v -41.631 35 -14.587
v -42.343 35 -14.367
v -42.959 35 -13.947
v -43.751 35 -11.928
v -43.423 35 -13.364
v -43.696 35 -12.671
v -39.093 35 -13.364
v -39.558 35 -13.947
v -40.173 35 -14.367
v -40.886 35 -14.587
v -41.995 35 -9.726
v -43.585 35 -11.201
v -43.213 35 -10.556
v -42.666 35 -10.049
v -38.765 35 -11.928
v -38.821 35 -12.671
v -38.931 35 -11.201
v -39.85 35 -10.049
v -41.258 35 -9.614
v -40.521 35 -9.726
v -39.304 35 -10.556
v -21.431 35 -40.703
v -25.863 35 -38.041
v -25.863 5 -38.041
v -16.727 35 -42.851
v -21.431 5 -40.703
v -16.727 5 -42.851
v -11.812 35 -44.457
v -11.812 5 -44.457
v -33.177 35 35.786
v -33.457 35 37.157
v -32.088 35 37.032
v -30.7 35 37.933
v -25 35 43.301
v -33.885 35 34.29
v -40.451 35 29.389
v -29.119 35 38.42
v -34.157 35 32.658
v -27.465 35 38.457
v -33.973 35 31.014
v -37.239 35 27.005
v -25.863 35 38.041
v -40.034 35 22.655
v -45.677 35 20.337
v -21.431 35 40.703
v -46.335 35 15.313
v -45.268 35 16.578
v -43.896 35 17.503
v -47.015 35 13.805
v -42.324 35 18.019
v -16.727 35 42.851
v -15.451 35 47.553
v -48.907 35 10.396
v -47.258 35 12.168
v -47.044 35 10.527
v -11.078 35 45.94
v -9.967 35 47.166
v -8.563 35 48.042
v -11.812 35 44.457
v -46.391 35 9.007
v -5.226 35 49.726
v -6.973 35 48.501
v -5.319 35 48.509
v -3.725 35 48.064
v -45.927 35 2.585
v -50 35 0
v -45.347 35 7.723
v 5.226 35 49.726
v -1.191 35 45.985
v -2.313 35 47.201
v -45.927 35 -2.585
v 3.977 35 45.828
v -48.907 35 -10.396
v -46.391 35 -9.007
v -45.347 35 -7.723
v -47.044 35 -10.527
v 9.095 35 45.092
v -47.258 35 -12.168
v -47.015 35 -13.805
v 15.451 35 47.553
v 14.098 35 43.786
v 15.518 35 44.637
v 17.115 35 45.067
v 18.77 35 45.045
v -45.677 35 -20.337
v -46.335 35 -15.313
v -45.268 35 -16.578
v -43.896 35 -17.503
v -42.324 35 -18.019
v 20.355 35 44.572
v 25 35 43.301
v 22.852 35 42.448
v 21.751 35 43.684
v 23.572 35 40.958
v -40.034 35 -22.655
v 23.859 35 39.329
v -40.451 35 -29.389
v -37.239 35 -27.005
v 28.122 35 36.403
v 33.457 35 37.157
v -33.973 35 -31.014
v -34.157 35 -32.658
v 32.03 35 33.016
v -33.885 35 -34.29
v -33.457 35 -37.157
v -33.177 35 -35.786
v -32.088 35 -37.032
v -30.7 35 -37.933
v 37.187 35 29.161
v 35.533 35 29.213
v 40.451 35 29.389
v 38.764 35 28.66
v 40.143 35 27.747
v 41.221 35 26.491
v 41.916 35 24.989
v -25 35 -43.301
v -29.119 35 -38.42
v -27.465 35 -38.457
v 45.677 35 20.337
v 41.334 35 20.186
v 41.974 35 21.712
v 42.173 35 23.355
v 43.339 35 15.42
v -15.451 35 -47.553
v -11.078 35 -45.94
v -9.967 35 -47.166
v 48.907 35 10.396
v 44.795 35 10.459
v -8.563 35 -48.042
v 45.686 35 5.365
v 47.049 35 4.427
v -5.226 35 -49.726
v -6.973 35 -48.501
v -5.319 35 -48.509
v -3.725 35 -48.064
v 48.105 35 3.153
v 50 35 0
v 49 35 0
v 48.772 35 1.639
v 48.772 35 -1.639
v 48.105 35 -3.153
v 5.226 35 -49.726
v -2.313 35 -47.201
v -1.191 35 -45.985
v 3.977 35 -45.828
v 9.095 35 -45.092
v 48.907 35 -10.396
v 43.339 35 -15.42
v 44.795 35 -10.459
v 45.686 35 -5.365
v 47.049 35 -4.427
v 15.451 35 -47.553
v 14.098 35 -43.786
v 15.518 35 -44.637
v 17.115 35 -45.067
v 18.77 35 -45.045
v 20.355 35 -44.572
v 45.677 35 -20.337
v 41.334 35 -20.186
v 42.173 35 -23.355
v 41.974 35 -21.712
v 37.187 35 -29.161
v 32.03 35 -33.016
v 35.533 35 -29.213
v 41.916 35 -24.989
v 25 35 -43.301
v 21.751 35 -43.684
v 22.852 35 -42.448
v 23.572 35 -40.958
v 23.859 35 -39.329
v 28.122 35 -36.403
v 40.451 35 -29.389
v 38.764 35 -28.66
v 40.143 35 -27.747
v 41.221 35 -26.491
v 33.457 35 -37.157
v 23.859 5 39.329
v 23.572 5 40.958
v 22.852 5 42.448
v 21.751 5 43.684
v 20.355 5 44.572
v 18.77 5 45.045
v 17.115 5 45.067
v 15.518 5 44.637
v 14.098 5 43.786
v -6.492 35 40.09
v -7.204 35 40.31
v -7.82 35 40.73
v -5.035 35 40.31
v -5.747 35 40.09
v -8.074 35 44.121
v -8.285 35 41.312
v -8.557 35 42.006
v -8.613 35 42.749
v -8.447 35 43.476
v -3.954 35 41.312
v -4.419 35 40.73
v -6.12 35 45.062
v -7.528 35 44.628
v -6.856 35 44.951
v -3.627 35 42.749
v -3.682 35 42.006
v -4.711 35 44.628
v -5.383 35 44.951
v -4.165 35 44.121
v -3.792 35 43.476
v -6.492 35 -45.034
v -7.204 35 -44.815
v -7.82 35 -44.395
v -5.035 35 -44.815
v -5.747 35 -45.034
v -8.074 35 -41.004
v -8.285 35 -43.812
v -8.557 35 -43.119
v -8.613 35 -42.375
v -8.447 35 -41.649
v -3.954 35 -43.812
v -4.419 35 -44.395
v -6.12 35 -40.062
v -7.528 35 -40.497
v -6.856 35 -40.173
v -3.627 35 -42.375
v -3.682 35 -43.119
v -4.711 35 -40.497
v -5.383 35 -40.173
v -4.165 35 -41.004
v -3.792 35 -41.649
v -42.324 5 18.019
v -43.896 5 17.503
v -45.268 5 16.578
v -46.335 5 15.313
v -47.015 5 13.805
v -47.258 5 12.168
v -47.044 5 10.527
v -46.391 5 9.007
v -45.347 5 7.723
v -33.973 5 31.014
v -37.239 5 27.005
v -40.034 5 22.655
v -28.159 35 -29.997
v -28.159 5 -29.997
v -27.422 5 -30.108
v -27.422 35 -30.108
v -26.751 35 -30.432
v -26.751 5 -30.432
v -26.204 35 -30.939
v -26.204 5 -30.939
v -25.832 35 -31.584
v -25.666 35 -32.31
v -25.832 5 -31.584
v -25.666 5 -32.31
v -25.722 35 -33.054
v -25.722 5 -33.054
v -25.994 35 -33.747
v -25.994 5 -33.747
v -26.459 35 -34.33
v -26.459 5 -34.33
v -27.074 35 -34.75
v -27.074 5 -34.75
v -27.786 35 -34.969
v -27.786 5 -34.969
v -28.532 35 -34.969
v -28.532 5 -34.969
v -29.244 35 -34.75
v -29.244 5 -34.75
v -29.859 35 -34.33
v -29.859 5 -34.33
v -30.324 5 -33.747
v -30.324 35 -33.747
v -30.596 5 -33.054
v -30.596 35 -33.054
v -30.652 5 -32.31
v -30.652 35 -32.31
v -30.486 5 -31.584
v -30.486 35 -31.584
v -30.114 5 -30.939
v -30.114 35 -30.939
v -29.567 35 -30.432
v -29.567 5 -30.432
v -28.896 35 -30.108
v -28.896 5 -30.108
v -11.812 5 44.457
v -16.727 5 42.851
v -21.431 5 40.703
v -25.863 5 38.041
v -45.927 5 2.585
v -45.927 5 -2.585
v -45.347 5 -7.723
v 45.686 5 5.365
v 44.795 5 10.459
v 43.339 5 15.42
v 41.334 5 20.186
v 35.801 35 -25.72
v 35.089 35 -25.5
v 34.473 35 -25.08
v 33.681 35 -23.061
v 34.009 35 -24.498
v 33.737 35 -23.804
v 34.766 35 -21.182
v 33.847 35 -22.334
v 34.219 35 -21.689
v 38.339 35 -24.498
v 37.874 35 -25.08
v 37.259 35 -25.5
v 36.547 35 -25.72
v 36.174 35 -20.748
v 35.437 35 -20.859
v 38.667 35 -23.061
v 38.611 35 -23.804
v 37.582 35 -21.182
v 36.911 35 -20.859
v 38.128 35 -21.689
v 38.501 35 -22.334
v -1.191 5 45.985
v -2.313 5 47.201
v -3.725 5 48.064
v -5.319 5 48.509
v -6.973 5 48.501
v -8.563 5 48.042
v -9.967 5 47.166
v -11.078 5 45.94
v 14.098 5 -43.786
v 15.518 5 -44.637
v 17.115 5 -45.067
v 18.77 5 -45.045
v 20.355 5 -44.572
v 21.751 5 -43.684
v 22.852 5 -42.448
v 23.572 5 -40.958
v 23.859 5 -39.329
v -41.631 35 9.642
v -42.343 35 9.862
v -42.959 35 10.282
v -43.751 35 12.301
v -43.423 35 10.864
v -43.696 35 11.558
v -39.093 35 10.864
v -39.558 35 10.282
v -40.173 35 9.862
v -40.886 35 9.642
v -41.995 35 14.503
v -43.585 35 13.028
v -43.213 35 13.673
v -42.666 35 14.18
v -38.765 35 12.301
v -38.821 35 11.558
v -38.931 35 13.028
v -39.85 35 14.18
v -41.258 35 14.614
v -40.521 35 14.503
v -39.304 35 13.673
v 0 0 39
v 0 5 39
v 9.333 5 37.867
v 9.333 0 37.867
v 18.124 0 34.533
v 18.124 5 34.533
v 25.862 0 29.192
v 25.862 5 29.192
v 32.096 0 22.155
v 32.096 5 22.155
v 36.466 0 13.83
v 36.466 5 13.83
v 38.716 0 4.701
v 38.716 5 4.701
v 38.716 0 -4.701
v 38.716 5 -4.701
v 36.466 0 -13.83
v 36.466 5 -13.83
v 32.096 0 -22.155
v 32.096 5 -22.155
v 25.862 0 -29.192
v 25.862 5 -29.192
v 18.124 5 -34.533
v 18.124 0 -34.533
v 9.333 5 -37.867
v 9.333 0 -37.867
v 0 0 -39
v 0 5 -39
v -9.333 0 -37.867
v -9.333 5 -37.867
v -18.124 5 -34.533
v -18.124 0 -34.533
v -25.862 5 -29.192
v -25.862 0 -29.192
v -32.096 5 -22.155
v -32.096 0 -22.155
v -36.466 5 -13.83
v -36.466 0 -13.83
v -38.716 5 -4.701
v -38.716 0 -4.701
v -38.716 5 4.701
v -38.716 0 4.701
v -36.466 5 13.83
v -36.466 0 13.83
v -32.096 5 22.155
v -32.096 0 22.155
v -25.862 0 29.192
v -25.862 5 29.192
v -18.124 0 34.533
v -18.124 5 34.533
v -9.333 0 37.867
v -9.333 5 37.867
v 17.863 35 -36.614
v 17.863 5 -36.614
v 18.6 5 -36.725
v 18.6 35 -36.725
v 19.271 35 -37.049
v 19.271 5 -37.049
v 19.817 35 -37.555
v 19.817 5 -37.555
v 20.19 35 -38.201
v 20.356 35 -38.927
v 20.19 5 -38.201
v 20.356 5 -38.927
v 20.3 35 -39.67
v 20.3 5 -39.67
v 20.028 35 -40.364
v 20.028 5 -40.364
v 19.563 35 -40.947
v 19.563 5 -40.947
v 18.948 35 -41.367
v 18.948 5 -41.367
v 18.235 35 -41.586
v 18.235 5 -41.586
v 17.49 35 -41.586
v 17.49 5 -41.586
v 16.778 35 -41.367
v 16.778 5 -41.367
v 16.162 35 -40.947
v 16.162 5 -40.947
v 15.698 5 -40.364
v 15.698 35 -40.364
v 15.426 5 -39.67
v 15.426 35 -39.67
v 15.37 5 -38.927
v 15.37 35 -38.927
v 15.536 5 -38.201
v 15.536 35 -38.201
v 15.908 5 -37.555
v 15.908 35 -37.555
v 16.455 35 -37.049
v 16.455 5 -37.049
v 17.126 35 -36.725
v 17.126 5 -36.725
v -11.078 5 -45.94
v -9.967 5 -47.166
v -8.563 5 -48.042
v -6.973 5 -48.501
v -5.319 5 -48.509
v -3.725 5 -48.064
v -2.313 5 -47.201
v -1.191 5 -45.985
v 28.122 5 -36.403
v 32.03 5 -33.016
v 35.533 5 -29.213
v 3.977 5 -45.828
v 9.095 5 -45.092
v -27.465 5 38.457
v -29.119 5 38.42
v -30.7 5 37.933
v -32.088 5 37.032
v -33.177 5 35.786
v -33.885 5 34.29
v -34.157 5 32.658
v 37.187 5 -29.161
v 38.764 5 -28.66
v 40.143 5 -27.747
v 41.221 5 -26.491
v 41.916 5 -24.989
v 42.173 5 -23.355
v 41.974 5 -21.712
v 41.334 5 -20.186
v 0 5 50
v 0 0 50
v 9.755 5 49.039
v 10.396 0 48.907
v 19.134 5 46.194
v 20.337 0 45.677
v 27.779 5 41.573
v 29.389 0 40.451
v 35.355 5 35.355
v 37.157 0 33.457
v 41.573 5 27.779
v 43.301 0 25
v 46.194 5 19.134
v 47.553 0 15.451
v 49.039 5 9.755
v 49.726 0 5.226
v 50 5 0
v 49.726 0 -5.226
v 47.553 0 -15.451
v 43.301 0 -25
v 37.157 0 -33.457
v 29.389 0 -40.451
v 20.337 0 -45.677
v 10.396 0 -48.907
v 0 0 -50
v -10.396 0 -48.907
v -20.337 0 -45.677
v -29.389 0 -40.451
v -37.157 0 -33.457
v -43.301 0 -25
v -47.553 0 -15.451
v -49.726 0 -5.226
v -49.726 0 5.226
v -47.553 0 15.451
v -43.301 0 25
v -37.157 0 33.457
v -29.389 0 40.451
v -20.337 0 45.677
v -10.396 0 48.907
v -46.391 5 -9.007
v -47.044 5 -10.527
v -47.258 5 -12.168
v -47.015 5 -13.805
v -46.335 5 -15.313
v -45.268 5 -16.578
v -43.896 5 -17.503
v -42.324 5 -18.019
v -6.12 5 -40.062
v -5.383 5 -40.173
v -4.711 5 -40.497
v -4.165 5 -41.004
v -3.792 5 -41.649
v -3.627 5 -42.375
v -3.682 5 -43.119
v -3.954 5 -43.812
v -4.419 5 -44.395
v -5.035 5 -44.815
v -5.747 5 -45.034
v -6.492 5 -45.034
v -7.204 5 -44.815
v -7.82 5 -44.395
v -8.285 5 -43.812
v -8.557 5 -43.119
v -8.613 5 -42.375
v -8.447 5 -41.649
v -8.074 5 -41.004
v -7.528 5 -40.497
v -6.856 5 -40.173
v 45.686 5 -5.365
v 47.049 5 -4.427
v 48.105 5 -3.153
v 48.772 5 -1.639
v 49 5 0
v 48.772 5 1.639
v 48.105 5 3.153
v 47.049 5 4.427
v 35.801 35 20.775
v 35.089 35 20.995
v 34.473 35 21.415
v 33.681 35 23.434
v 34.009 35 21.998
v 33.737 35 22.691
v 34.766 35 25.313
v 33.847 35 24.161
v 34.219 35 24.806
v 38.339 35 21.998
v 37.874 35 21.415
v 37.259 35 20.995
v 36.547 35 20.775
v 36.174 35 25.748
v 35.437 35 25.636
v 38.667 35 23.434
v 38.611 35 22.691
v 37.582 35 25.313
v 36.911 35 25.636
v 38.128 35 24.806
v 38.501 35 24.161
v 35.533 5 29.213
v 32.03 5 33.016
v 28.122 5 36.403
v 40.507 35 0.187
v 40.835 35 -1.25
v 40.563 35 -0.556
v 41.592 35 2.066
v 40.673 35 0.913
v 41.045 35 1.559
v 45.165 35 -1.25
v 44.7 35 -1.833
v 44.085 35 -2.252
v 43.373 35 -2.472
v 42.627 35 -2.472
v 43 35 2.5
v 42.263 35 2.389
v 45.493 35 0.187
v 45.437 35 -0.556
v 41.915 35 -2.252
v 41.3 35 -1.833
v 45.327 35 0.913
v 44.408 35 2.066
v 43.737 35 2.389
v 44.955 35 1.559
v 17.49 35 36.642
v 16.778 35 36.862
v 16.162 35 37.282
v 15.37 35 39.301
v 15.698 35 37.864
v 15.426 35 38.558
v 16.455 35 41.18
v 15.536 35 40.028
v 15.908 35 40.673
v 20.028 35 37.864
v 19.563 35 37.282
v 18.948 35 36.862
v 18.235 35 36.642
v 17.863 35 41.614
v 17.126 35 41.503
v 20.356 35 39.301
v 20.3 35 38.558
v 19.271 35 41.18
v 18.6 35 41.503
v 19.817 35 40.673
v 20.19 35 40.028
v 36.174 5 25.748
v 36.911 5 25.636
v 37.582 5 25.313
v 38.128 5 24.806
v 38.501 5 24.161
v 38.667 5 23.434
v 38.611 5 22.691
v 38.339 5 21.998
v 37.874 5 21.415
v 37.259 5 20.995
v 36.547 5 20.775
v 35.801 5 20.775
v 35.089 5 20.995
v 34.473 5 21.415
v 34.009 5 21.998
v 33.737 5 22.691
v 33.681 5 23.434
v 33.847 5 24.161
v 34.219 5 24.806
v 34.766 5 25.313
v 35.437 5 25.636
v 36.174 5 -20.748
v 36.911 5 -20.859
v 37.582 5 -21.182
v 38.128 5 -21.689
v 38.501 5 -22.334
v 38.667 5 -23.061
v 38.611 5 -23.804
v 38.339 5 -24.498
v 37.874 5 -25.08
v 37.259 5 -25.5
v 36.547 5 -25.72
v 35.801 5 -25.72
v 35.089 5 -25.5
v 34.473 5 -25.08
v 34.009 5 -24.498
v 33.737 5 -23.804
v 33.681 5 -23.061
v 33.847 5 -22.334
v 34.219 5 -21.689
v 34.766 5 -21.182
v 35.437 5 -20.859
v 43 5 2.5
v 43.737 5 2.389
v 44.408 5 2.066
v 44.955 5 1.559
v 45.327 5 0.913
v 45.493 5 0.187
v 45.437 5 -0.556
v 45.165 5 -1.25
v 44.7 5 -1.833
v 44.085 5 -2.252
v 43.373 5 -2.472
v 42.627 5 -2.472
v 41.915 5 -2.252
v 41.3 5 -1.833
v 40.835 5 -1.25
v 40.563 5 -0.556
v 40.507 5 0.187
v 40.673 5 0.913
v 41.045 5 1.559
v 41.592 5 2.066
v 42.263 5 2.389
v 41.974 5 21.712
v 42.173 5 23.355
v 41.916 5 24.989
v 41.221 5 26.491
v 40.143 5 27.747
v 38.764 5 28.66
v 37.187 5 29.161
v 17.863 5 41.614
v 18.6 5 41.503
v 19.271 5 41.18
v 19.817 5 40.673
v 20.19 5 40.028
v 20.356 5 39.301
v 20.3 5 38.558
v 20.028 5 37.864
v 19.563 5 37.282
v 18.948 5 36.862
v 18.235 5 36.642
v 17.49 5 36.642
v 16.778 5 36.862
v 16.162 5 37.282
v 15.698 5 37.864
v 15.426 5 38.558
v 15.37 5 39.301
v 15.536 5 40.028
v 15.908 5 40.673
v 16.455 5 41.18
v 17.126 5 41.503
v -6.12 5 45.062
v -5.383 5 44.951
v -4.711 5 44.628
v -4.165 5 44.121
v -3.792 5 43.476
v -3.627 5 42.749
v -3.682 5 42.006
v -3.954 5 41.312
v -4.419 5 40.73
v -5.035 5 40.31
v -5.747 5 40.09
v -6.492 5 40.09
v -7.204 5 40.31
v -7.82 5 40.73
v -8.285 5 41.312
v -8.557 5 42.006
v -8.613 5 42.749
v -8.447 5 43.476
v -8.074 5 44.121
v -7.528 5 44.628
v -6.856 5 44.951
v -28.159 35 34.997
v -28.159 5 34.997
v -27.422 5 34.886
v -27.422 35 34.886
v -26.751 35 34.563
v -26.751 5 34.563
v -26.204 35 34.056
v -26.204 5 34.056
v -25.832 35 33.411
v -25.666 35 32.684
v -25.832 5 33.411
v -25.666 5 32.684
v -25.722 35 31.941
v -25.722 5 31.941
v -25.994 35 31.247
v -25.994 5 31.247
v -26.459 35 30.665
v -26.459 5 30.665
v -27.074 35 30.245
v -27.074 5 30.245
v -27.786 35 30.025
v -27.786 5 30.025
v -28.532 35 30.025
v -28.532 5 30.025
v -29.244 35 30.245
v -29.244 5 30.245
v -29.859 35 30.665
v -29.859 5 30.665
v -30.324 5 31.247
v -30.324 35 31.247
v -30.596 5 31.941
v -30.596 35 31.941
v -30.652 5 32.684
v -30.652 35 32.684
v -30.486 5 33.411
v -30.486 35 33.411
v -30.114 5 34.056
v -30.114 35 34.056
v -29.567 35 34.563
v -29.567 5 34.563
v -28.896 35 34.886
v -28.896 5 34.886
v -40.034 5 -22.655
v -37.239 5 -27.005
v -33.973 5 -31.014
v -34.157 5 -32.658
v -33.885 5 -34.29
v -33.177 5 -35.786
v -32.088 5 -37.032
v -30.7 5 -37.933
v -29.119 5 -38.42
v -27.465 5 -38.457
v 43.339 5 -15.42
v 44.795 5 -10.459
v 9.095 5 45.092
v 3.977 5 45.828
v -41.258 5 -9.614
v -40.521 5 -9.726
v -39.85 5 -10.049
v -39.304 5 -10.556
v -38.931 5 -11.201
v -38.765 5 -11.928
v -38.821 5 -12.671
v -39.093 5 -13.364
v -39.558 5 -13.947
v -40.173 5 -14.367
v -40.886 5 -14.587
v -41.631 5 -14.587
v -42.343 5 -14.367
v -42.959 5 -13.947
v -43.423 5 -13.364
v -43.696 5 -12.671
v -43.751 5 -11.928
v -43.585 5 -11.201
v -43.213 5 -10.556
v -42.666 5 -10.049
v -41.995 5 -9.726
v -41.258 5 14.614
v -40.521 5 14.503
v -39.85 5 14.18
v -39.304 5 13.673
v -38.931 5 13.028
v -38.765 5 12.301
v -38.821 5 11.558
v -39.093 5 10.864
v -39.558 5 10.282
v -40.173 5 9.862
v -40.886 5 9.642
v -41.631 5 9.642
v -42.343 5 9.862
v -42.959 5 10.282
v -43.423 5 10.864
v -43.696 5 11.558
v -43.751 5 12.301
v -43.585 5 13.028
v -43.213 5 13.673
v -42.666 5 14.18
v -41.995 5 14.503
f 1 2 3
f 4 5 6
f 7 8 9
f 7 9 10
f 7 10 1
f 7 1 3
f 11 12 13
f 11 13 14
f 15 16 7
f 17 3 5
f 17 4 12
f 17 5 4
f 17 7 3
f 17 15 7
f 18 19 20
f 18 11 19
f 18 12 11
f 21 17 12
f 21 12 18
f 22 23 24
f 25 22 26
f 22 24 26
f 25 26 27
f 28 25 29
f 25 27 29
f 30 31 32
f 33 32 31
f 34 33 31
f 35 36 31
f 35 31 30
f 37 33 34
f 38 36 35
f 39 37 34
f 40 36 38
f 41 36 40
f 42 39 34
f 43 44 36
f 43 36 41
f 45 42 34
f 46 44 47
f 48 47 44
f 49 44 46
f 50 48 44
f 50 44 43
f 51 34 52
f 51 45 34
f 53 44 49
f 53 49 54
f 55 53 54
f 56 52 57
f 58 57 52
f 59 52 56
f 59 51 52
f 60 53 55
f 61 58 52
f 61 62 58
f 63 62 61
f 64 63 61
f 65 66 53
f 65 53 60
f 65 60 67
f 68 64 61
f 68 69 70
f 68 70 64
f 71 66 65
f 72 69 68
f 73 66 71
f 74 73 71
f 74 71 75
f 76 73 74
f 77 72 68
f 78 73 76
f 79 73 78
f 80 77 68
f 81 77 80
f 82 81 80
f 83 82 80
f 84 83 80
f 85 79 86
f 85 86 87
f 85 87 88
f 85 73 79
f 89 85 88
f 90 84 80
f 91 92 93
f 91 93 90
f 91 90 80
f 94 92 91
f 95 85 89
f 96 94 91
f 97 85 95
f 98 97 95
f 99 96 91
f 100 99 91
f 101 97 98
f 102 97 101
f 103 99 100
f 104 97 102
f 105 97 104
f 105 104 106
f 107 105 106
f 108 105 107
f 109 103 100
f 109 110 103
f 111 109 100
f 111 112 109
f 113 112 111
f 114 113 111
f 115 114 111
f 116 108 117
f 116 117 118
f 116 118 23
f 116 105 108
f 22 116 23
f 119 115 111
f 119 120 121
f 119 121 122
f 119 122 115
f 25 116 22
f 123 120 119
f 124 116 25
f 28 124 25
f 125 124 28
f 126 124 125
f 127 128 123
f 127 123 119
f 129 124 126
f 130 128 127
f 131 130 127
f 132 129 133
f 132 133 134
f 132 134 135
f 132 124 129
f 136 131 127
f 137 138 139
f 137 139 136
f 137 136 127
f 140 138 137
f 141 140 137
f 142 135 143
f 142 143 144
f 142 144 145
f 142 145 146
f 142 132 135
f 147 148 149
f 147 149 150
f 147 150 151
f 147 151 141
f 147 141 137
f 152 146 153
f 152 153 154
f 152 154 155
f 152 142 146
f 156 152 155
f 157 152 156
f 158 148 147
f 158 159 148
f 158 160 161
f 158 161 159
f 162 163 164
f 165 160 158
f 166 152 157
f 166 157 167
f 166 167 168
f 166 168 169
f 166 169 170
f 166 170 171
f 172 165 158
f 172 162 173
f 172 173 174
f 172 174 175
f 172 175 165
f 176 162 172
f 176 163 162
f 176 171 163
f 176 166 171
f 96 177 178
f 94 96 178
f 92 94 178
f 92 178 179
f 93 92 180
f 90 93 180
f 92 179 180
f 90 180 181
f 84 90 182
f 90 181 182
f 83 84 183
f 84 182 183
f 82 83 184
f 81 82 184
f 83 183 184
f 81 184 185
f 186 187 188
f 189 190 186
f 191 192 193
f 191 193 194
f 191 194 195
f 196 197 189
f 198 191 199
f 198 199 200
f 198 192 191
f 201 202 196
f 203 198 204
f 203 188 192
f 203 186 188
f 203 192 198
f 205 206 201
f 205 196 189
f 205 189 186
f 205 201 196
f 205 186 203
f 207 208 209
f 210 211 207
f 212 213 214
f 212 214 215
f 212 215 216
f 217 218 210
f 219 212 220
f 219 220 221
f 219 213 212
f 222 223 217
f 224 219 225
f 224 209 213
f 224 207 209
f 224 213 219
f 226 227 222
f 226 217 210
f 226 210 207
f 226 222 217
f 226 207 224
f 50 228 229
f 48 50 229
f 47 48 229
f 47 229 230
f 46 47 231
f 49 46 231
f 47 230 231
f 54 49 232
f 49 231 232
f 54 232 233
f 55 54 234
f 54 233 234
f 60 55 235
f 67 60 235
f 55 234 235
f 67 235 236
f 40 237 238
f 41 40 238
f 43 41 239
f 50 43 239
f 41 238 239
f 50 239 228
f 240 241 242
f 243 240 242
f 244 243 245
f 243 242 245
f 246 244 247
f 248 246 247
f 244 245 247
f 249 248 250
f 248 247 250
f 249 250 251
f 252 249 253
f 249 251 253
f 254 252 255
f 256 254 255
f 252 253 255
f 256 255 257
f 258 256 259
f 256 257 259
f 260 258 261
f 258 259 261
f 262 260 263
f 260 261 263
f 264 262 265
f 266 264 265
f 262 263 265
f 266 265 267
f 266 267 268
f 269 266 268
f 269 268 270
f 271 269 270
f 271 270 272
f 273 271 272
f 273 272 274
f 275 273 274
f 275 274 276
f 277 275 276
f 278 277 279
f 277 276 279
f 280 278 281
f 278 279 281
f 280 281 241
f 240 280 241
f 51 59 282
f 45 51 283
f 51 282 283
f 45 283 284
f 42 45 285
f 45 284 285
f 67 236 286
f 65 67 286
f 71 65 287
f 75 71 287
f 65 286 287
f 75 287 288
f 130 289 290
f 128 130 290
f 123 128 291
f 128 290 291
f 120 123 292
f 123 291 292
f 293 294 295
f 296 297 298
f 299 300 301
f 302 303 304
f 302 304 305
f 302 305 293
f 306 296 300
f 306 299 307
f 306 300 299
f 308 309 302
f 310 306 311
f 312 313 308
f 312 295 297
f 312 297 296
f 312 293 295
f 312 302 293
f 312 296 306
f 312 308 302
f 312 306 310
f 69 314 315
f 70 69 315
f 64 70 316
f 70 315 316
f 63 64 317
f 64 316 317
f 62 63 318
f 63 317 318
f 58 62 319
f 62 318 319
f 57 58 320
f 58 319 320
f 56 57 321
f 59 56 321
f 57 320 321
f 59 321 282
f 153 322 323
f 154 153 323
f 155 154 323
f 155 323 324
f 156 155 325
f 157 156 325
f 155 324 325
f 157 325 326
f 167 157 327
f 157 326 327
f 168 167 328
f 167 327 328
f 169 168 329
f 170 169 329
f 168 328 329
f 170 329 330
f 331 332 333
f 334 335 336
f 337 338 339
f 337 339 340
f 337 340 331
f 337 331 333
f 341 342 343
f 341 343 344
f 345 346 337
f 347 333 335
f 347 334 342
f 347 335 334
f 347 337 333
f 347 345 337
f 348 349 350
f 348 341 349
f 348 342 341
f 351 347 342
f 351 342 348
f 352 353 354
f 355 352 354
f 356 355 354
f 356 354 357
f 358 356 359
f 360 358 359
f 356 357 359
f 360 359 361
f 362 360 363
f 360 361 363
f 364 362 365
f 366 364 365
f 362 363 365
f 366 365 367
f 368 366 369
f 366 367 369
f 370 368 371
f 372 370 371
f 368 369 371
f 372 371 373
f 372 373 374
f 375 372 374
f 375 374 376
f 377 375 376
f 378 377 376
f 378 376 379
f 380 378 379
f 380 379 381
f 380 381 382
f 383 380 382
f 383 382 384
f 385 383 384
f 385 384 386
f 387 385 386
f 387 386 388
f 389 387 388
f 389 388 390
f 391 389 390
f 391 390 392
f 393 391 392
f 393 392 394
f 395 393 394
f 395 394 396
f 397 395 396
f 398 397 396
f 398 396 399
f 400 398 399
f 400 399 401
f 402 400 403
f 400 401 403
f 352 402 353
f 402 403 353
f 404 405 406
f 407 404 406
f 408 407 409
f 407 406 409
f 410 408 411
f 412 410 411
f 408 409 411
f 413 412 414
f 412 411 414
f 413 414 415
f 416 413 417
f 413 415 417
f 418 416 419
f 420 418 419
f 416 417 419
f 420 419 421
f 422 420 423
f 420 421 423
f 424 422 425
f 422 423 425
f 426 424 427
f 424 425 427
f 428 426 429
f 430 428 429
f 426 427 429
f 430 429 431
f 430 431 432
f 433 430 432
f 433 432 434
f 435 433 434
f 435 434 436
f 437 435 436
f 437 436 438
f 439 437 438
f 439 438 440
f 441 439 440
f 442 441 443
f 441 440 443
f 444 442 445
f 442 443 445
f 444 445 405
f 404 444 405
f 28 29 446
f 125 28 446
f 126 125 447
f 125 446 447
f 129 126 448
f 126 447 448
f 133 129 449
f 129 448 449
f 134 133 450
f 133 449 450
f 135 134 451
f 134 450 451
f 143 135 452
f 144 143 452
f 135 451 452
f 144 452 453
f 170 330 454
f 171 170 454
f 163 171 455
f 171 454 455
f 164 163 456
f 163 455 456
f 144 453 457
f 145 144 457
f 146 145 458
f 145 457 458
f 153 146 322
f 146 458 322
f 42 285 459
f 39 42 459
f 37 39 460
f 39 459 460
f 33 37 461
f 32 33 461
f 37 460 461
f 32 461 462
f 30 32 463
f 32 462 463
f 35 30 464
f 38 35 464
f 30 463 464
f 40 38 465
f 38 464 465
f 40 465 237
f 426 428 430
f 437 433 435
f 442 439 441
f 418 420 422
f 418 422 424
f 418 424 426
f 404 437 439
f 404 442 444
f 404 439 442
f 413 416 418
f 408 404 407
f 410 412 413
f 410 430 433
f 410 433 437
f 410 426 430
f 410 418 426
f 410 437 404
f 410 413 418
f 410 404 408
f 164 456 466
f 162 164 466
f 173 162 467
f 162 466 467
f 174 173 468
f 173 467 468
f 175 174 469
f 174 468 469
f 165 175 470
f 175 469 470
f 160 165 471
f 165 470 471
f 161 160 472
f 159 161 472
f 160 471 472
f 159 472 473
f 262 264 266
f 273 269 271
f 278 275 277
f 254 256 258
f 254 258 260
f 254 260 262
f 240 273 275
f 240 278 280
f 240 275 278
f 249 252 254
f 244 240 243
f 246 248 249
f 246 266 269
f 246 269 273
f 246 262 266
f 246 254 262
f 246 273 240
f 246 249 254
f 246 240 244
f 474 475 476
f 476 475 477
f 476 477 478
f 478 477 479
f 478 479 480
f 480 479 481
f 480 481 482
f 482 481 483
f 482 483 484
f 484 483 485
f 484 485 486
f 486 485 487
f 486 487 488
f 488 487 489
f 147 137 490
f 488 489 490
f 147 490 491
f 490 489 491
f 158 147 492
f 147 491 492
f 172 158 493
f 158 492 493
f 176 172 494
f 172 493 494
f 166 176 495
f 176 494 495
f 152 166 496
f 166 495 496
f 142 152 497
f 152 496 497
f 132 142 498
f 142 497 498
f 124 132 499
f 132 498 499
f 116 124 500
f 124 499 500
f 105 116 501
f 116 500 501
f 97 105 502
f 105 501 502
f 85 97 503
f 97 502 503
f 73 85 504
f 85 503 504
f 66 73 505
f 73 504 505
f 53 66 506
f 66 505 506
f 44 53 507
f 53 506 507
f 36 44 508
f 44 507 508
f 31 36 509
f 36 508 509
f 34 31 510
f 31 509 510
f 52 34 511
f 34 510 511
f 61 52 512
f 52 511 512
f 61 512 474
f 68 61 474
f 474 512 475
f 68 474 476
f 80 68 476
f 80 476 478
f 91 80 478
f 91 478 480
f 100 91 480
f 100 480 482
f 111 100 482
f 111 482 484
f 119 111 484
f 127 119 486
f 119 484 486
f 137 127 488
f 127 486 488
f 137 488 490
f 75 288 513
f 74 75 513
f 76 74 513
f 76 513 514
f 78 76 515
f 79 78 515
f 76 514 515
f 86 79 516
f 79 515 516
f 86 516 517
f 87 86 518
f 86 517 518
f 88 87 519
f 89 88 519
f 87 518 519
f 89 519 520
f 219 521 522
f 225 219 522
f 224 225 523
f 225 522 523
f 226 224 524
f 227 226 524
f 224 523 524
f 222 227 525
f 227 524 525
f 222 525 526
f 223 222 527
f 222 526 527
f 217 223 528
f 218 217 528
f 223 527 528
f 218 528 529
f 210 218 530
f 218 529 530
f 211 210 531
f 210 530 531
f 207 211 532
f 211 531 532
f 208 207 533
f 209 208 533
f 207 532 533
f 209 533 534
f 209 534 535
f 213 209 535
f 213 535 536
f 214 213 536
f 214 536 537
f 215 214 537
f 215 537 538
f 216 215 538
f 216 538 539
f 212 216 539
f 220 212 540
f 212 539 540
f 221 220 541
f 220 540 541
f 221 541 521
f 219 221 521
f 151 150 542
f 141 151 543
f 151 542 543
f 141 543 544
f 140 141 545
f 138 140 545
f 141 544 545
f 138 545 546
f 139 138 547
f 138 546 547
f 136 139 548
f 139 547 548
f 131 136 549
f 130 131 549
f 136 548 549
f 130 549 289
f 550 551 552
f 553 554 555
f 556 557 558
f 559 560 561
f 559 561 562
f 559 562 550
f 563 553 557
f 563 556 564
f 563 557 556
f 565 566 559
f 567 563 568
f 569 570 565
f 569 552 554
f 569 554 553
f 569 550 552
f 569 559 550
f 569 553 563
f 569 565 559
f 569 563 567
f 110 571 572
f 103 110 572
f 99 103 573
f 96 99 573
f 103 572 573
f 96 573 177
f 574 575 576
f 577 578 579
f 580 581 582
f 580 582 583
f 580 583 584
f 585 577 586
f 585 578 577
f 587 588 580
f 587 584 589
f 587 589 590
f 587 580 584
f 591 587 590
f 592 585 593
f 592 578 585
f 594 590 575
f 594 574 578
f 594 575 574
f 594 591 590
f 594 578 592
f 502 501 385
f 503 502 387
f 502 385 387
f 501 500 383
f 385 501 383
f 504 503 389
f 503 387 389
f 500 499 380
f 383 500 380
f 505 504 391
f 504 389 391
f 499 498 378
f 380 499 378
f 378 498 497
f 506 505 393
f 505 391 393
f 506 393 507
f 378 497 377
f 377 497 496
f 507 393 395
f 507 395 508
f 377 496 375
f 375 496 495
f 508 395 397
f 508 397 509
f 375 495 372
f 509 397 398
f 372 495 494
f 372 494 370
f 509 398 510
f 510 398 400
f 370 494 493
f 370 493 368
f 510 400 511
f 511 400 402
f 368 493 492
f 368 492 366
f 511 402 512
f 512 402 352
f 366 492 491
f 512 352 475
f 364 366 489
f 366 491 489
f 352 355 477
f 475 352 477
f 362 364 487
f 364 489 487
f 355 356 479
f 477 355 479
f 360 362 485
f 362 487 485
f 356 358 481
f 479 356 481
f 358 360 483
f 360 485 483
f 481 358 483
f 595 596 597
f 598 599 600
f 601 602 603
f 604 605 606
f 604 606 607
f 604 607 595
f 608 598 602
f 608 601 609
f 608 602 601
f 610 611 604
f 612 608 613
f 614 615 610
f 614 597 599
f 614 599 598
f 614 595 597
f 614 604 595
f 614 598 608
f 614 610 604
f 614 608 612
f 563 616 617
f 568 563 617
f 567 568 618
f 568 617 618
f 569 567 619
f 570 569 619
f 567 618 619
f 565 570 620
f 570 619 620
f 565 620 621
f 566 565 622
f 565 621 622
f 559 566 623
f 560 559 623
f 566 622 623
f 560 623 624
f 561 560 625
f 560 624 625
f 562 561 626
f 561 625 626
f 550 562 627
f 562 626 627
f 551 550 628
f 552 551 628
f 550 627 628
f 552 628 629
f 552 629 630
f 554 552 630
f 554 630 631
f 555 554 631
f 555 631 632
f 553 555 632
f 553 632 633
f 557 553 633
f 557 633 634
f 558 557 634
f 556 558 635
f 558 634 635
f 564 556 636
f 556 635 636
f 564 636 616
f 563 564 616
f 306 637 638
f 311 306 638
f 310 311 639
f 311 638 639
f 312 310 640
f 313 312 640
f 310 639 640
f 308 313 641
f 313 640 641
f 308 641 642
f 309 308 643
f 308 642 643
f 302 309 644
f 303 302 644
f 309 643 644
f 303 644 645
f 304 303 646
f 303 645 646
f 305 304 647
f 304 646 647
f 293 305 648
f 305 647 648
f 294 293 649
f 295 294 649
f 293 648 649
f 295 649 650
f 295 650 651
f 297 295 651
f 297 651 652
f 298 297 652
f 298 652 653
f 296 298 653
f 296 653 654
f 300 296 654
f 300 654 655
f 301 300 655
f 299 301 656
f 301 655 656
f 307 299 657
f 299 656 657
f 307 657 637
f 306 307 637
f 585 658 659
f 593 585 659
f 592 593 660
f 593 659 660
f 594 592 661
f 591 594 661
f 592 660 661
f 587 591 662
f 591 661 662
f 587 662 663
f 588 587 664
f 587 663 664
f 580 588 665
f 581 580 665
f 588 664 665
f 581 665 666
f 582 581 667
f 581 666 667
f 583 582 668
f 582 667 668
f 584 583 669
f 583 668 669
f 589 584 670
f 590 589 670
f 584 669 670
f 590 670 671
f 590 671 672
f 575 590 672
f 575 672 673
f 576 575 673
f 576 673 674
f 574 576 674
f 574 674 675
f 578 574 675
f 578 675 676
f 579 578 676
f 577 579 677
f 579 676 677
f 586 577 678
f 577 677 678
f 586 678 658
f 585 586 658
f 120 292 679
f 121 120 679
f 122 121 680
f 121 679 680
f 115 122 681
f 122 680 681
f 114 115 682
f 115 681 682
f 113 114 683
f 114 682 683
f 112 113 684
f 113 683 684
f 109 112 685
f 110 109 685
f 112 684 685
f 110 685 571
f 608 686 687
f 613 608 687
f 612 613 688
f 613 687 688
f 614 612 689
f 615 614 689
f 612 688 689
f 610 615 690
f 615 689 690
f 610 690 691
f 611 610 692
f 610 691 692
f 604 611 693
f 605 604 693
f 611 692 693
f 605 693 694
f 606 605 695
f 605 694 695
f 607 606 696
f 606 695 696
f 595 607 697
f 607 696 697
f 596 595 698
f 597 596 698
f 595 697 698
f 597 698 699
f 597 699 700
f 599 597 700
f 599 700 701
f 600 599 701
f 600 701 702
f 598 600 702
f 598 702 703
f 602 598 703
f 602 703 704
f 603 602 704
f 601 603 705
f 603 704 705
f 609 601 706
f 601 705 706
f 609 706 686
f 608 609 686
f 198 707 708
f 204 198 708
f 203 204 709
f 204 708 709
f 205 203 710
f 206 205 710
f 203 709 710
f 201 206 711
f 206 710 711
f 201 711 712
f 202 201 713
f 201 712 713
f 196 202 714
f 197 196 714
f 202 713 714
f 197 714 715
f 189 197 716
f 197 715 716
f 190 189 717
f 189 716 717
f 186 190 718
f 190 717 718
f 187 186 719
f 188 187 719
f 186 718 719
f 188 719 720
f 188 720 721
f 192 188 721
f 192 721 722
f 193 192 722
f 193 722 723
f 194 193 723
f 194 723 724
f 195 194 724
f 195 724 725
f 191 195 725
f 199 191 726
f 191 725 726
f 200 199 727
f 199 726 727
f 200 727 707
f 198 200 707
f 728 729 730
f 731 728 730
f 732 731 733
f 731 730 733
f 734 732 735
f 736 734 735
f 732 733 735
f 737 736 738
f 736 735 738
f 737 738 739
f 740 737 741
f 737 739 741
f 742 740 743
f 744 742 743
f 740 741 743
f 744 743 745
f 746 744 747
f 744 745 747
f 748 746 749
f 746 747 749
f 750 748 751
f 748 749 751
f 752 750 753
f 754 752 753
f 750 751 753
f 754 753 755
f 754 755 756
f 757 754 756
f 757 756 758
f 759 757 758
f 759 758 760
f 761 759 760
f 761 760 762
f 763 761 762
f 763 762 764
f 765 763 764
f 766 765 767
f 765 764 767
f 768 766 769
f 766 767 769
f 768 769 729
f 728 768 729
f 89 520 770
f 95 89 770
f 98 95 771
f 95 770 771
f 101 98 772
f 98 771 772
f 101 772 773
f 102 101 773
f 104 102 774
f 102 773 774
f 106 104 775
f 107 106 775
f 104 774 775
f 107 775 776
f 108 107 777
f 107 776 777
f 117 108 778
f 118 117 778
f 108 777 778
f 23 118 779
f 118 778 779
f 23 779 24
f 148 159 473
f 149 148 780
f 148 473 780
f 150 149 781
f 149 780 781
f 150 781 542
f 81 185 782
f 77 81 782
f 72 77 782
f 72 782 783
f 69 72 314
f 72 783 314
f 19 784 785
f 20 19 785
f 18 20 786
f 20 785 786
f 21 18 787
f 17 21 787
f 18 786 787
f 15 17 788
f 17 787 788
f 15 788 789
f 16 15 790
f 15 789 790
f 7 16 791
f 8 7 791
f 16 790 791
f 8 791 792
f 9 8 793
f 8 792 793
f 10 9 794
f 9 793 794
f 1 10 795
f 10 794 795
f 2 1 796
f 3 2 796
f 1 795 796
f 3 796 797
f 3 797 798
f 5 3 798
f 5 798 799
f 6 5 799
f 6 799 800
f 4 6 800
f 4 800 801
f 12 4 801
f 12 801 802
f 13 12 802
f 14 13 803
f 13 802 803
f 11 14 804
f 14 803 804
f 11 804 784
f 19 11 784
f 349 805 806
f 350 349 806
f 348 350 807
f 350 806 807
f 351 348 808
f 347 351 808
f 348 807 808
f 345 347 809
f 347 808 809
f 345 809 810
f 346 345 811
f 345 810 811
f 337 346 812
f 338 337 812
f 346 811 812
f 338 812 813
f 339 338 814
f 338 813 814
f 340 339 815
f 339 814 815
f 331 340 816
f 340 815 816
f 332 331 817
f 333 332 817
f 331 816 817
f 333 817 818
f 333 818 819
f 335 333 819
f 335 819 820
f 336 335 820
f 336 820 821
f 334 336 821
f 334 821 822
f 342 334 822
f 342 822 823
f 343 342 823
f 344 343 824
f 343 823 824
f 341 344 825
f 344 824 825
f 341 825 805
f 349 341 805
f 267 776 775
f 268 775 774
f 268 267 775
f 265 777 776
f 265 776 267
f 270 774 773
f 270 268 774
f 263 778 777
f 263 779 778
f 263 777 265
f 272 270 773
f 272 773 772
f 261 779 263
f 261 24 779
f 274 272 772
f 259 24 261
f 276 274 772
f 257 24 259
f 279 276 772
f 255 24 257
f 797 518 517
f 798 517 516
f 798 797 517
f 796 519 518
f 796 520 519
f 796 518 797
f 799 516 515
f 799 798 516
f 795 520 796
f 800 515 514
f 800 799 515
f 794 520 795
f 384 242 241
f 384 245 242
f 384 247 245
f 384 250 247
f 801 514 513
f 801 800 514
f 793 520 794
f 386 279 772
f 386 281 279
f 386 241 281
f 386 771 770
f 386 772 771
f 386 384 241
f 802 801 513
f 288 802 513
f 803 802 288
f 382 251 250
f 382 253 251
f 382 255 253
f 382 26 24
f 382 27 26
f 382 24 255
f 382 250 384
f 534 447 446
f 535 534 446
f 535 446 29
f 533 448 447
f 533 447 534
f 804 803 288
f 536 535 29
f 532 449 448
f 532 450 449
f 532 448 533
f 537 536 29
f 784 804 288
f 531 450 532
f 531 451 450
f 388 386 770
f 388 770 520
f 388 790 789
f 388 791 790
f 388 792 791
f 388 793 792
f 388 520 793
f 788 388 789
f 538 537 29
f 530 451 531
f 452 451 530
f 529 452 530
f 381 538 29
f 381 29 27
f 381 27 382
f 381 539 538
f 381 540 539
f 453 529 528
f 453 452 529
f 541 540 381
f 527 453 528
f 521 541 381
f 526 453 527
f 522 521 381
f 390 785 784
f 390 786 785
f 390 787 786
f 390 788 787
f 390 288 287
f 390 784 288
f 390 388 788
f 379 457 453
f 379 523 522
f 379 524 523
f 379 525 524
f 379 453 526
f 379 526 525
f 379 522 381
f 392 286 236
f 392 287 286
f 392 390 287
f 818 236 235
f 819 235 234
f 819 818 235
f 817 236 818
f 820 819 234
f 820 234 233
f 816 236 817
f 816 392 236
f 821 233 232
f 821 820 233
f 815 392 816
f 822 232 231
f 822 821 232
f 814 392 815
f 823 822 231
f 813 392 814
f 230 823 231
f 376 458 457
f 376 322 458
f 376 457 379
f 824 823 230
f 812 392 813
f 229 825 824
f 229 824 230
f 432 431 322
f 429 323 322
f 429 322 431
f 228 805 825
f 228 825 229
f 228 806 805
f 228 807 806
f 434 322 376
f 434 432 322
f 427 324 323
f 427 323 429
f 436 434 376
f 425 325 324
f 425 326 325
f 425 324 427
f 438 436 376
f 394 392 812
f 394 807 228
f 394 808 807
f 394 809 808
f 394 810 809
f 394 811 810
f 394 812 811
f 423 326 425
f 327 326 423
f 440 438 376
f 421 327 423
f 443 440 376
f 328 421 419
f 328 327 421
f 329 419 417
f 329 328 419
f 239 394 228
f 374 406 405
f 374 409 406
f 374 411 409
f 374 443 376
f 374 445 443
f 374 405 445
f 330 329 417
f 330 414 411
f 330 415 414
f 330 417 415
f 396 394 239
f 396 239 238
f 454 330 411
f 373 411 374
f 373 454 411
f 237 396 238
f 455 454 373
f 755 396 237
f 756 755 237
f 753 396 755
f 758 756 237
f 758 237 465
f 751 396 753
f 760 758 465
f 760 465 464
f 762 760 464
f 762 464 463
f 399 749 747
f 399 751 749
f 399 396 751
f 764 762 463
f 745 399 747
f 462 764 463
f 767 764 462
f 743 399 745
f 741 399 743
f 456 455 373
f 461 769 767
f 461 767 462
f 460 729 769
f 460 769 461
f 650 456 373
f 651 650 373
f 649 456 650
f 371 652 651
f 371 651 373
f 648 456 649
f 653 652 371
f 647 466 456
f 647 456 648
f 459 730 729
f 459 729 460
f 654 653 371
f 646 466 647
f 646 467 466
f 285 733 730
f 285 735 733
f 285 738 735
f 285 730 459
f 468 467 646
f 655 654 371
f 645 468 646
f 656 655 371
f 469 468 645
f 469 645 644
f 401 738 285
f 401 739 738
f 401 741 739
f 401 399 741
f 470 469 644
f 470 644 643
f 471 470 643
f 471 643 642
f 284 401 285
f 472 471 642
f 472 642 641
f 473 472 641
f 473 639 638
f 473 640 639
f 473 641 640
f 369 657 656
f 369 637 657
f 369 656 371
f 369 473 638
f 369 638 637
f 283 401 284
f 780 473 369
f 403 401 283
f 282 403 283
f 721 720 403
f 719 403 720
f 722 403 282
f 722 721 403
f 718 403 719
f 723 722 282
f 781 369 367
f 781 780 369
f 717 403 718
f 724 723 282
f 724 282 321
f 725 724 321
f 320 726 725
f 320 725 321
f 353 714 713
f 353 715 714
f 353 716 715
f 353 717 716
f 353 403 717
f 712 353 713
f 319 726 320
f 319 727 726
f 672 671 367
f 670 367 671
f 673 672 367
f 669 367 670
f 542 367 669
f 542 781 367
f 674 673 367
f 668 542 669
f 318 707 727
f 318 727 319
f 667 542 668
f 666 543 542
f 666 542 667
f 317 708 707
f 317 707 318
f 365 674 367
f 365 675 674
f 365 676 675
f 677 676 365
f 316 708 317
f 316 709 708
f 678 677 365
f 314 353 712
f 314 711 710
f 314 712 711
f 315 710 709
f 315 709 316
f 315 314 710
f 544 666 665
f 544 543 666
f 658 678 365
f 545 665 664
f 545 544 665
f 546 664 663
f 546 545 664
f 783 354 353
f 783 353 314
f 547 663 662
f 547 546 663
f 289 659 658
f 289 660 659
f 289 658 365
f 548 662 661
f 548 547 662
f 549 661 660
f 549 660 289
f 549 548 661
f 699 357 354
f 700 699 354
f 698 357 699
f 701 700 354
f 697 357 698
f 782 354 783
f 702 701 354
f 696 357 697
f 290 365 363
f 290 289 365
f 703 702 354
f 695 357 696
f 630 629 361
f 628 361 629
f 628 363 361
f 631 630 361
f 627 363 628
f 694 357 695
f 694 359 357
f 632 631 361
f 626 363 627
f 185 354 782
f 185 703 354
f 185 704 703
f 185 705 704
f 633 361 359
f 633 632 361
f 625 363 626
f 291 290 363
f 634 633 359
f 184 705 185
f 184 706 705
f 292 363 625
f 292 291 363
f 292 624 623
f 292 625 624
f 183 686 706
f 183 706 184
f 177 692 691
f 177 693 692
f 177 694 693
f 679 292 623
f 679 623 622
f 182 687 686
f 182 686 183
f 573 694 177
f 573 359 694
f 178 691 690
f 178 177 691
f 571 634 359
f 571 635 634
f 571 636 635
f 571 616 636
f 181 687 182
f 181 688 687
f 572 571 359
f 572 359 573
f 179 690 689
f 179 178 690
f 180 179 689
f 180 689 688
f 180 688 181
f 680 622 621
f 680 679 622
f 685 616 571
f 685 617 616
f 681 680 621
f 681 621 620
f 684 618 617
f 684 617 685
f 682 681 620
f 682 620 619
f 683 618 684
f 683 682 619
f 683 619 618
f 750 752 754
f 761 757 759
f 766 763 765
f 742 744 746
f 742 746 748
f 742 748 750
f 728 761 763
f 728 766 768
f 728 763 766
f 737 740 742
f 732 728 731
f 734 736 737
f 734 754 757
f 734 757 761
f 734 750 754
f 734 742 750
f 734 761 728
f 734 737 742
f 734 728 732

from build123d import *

# Parameters (mm, degrees)
SKETCH1_R               = 50
BOSS_EXTRUDE1_DEPTH     = 5
SKETCH2_R               = 2.5
BOSS_EXTRUDE2_DEPTH     = 30
BOSS_EXTRUDE3_OUTLINE_R = 50
BOSS_EXTRUDE3_DEPTH     = 30
SKETCH4_R               = 39
CUT_EXTRUDE1_DEPTH      = 6


# Read off the part's stored shape, not the designer's step: Boss-Extrude3
with BuildPart() as part:
    # Sketch1 → Boss-Extrude1 (new body)
    with BuildSketch(Plane(origin=(0, 0, 0), x_dir=(1, 0, 0), z_dir=(0, 1, 0))):
        with Locations(Location((0, 0, 0), (0, 0, 270))):
            Circle(SKETCH1_R)
    extrude(amount=BOSS_EXTRUDE1_DEPTH)

    # Sketch2 → Boss-Extrude2 (add)
    with BuildSketch(Plane(origin=(0, 5, 0), x_dir=(1, 0, 0), z_dir=(0, 1, 0))):
        with Locations(Location((43, 0, 0), (0, 0, 270))):
            Circle(SKETCH2_R)
        with Locations(Location((36.173901912, -23.247555151, 0), (0, 0, 270))):
            Circle(SKETCH2_R)
        with Locations(Location((17.862845559, -39.1141758, 0), (0, 0, 270))):
            Circle(SKETCH2_R)
        with Locations(Location((-6.119538046, -42.562322001, 0), (0, 0, 270))):
            Circle(SKETCH2_R)
        with Locations(Location((-28.15901156, -32.497231697, 0), (0, 0, 270))):
            Circle(SKETCH2_R)
        with Locations(Location((-41.258197865, -12.114499944, 0), (0, 0, 270))):
            Circle(SKETCH2_R)
        with Locations(Location((-41.258197865, 12.114499944, 0), (0, 0, 270))):
            Circle(SKETCH2_R)
        with Locations(Location((-28.15901156, 32.497231697, 0), (0, 0, 270))):
            Circle(SKETCH2_R)
        with Locations(Location((-6.119538046, 42.562322001, 0), (0, 0, 270))):
            Circle(SKETCH2_R)
        with Locations(Location((17.862845559, 39.1141758, 0), (0, 0, 270))):
            Circle(SKETCH2_R)
        with Locations(Location((36.173901912, 23.247555151, 0), (0, 0, 270))):
            Circle(SKETCH2_R)
    extrude(amount=BOSS_EXTRUDE2_DEPTH)

    # Boss-Extrude3 outline → Boss-Extrude3 (add)
    with BuildSketch(Plane(origin=(0, 5, 0), x_dir=(1, 0, 0), z_dir=(0, 1, 0))):
        Circle(BOSS_EXTRUDE3_OUTLINE_R)
        with BuildLine():
            ThreePointArc((45.686046512, 5.365179786), (49, 0), (45.686046512, -5.365179786))
            ThreePointArc((45.686046512, -5.365179786), (44.136676786, -12.959697615), (41.334183214, -20.186265083))
            ThreePointArc((41.334183214, -20.186265083), (41.221423109, -26.491400055), (35.532912844, -29.213217982))
            ThreePointArc((35.532912844, -29.213217982), (30.123593761, -34.76448042), (23.8590088, -39.328713418))
            ThreePointArc((23.8590088, -39.328713418), (20.355335637, -44.571967772), (14.098330411, -43.786265879))
            ThreePointArc((14.098330411, -43.786265879), (6.54648256, -45.531786327), (-1.191232329, -45.984573126))
            ThreePointArc((-1.191232329, -45.984573126), (-6.973427076, -48.501250652), (-11.812372312, -44.457483738))
            ThreePointArc((-11.812372312, -44.457483738), (-19.109090598, -41.843071786), (-25.86326561, -38.040655778))
            ThreePointArc((-25.86326561, -38.040655778), (-32.088175963, -37.031729143), (-33.972730289, -31.013764633))
            ThreePointArc((-33.972730289, -31.013764633), (-38.69766251, -24.869477603), (-42.323894801, -18.019099003))
            ThreePointArc((-42.323894801, -18.019099003), (-47.015155707, -13.804895285), (-45.346986439, -7.723394389))
            ThreePointArc((-45.346986439, -7.723394389), (-46, 0), (-45.346986439, 7.723394389))
            ThreePointArc((-45.346986439, 7.723394389), (-47.015155707, 13.804895285), (-42.323894801, 18.019099003))
            ThreePointArc((-42.323894801, 18.019099003), (-38.69766251, 24.869477603), (-33.972730289, 31.013764633))
            ThreePointArc((-33.972730289, 31.013764633), (-32.088175963, 37.031729143), (-25.86326561, 38.040655778))
            ThreePointArc((-25.86326561, 38.040655778), (-19.109090598, 41.843071786), (-11.812372312, 44.457483738))
            ThreePointArc((-11.812372312, 44.457483738), (-6.973427076, 48.501250652), (-1.191232329, 45.984573126))
            ThreePointArc((-1.191232329, 45.984573126), (6.54648256, 45.531786327), (14.098330411, 43.786265879))
            ThreePointArc((14.098330411, 43.786265879), (20.355335637, 44.571967772), (23.8590088, 39.328713418))
            ThreePointArc((23.8590088, 39.328713418), (30.123593761, 34.76448042), (35.532912844, 29.213217982))
            ThreePointArc((35.532912844, 29.213217982), (41.221423109, 26.491400055), (41.334183214, 20.186265083))
            ThreePointArc((41.334183214, 20.186265083), (44.136676786, 12.959697615), (45.686046512, 5.365179786))
        make_face(mode=Mode.SUBTRACT)
    extrude(amount=BOSS_EXTRUDE3_DEPTH)

    # Sketch4 → Cut-Extrude1 (cut)
    with BuildSketch(Plane(origin=(0, 5, 0), x_dir=(1, 0, 0), z_dir=(0, 1, 0))):
        with Locations(Location((0, 0, 0), (0, 0, 270))):
            Circle(SKETCH4_R)
    extrude(amount=-CUT_EXTRUDE1_DEPTH, mode=Mode.SUBTRACT)


solid = part.part
